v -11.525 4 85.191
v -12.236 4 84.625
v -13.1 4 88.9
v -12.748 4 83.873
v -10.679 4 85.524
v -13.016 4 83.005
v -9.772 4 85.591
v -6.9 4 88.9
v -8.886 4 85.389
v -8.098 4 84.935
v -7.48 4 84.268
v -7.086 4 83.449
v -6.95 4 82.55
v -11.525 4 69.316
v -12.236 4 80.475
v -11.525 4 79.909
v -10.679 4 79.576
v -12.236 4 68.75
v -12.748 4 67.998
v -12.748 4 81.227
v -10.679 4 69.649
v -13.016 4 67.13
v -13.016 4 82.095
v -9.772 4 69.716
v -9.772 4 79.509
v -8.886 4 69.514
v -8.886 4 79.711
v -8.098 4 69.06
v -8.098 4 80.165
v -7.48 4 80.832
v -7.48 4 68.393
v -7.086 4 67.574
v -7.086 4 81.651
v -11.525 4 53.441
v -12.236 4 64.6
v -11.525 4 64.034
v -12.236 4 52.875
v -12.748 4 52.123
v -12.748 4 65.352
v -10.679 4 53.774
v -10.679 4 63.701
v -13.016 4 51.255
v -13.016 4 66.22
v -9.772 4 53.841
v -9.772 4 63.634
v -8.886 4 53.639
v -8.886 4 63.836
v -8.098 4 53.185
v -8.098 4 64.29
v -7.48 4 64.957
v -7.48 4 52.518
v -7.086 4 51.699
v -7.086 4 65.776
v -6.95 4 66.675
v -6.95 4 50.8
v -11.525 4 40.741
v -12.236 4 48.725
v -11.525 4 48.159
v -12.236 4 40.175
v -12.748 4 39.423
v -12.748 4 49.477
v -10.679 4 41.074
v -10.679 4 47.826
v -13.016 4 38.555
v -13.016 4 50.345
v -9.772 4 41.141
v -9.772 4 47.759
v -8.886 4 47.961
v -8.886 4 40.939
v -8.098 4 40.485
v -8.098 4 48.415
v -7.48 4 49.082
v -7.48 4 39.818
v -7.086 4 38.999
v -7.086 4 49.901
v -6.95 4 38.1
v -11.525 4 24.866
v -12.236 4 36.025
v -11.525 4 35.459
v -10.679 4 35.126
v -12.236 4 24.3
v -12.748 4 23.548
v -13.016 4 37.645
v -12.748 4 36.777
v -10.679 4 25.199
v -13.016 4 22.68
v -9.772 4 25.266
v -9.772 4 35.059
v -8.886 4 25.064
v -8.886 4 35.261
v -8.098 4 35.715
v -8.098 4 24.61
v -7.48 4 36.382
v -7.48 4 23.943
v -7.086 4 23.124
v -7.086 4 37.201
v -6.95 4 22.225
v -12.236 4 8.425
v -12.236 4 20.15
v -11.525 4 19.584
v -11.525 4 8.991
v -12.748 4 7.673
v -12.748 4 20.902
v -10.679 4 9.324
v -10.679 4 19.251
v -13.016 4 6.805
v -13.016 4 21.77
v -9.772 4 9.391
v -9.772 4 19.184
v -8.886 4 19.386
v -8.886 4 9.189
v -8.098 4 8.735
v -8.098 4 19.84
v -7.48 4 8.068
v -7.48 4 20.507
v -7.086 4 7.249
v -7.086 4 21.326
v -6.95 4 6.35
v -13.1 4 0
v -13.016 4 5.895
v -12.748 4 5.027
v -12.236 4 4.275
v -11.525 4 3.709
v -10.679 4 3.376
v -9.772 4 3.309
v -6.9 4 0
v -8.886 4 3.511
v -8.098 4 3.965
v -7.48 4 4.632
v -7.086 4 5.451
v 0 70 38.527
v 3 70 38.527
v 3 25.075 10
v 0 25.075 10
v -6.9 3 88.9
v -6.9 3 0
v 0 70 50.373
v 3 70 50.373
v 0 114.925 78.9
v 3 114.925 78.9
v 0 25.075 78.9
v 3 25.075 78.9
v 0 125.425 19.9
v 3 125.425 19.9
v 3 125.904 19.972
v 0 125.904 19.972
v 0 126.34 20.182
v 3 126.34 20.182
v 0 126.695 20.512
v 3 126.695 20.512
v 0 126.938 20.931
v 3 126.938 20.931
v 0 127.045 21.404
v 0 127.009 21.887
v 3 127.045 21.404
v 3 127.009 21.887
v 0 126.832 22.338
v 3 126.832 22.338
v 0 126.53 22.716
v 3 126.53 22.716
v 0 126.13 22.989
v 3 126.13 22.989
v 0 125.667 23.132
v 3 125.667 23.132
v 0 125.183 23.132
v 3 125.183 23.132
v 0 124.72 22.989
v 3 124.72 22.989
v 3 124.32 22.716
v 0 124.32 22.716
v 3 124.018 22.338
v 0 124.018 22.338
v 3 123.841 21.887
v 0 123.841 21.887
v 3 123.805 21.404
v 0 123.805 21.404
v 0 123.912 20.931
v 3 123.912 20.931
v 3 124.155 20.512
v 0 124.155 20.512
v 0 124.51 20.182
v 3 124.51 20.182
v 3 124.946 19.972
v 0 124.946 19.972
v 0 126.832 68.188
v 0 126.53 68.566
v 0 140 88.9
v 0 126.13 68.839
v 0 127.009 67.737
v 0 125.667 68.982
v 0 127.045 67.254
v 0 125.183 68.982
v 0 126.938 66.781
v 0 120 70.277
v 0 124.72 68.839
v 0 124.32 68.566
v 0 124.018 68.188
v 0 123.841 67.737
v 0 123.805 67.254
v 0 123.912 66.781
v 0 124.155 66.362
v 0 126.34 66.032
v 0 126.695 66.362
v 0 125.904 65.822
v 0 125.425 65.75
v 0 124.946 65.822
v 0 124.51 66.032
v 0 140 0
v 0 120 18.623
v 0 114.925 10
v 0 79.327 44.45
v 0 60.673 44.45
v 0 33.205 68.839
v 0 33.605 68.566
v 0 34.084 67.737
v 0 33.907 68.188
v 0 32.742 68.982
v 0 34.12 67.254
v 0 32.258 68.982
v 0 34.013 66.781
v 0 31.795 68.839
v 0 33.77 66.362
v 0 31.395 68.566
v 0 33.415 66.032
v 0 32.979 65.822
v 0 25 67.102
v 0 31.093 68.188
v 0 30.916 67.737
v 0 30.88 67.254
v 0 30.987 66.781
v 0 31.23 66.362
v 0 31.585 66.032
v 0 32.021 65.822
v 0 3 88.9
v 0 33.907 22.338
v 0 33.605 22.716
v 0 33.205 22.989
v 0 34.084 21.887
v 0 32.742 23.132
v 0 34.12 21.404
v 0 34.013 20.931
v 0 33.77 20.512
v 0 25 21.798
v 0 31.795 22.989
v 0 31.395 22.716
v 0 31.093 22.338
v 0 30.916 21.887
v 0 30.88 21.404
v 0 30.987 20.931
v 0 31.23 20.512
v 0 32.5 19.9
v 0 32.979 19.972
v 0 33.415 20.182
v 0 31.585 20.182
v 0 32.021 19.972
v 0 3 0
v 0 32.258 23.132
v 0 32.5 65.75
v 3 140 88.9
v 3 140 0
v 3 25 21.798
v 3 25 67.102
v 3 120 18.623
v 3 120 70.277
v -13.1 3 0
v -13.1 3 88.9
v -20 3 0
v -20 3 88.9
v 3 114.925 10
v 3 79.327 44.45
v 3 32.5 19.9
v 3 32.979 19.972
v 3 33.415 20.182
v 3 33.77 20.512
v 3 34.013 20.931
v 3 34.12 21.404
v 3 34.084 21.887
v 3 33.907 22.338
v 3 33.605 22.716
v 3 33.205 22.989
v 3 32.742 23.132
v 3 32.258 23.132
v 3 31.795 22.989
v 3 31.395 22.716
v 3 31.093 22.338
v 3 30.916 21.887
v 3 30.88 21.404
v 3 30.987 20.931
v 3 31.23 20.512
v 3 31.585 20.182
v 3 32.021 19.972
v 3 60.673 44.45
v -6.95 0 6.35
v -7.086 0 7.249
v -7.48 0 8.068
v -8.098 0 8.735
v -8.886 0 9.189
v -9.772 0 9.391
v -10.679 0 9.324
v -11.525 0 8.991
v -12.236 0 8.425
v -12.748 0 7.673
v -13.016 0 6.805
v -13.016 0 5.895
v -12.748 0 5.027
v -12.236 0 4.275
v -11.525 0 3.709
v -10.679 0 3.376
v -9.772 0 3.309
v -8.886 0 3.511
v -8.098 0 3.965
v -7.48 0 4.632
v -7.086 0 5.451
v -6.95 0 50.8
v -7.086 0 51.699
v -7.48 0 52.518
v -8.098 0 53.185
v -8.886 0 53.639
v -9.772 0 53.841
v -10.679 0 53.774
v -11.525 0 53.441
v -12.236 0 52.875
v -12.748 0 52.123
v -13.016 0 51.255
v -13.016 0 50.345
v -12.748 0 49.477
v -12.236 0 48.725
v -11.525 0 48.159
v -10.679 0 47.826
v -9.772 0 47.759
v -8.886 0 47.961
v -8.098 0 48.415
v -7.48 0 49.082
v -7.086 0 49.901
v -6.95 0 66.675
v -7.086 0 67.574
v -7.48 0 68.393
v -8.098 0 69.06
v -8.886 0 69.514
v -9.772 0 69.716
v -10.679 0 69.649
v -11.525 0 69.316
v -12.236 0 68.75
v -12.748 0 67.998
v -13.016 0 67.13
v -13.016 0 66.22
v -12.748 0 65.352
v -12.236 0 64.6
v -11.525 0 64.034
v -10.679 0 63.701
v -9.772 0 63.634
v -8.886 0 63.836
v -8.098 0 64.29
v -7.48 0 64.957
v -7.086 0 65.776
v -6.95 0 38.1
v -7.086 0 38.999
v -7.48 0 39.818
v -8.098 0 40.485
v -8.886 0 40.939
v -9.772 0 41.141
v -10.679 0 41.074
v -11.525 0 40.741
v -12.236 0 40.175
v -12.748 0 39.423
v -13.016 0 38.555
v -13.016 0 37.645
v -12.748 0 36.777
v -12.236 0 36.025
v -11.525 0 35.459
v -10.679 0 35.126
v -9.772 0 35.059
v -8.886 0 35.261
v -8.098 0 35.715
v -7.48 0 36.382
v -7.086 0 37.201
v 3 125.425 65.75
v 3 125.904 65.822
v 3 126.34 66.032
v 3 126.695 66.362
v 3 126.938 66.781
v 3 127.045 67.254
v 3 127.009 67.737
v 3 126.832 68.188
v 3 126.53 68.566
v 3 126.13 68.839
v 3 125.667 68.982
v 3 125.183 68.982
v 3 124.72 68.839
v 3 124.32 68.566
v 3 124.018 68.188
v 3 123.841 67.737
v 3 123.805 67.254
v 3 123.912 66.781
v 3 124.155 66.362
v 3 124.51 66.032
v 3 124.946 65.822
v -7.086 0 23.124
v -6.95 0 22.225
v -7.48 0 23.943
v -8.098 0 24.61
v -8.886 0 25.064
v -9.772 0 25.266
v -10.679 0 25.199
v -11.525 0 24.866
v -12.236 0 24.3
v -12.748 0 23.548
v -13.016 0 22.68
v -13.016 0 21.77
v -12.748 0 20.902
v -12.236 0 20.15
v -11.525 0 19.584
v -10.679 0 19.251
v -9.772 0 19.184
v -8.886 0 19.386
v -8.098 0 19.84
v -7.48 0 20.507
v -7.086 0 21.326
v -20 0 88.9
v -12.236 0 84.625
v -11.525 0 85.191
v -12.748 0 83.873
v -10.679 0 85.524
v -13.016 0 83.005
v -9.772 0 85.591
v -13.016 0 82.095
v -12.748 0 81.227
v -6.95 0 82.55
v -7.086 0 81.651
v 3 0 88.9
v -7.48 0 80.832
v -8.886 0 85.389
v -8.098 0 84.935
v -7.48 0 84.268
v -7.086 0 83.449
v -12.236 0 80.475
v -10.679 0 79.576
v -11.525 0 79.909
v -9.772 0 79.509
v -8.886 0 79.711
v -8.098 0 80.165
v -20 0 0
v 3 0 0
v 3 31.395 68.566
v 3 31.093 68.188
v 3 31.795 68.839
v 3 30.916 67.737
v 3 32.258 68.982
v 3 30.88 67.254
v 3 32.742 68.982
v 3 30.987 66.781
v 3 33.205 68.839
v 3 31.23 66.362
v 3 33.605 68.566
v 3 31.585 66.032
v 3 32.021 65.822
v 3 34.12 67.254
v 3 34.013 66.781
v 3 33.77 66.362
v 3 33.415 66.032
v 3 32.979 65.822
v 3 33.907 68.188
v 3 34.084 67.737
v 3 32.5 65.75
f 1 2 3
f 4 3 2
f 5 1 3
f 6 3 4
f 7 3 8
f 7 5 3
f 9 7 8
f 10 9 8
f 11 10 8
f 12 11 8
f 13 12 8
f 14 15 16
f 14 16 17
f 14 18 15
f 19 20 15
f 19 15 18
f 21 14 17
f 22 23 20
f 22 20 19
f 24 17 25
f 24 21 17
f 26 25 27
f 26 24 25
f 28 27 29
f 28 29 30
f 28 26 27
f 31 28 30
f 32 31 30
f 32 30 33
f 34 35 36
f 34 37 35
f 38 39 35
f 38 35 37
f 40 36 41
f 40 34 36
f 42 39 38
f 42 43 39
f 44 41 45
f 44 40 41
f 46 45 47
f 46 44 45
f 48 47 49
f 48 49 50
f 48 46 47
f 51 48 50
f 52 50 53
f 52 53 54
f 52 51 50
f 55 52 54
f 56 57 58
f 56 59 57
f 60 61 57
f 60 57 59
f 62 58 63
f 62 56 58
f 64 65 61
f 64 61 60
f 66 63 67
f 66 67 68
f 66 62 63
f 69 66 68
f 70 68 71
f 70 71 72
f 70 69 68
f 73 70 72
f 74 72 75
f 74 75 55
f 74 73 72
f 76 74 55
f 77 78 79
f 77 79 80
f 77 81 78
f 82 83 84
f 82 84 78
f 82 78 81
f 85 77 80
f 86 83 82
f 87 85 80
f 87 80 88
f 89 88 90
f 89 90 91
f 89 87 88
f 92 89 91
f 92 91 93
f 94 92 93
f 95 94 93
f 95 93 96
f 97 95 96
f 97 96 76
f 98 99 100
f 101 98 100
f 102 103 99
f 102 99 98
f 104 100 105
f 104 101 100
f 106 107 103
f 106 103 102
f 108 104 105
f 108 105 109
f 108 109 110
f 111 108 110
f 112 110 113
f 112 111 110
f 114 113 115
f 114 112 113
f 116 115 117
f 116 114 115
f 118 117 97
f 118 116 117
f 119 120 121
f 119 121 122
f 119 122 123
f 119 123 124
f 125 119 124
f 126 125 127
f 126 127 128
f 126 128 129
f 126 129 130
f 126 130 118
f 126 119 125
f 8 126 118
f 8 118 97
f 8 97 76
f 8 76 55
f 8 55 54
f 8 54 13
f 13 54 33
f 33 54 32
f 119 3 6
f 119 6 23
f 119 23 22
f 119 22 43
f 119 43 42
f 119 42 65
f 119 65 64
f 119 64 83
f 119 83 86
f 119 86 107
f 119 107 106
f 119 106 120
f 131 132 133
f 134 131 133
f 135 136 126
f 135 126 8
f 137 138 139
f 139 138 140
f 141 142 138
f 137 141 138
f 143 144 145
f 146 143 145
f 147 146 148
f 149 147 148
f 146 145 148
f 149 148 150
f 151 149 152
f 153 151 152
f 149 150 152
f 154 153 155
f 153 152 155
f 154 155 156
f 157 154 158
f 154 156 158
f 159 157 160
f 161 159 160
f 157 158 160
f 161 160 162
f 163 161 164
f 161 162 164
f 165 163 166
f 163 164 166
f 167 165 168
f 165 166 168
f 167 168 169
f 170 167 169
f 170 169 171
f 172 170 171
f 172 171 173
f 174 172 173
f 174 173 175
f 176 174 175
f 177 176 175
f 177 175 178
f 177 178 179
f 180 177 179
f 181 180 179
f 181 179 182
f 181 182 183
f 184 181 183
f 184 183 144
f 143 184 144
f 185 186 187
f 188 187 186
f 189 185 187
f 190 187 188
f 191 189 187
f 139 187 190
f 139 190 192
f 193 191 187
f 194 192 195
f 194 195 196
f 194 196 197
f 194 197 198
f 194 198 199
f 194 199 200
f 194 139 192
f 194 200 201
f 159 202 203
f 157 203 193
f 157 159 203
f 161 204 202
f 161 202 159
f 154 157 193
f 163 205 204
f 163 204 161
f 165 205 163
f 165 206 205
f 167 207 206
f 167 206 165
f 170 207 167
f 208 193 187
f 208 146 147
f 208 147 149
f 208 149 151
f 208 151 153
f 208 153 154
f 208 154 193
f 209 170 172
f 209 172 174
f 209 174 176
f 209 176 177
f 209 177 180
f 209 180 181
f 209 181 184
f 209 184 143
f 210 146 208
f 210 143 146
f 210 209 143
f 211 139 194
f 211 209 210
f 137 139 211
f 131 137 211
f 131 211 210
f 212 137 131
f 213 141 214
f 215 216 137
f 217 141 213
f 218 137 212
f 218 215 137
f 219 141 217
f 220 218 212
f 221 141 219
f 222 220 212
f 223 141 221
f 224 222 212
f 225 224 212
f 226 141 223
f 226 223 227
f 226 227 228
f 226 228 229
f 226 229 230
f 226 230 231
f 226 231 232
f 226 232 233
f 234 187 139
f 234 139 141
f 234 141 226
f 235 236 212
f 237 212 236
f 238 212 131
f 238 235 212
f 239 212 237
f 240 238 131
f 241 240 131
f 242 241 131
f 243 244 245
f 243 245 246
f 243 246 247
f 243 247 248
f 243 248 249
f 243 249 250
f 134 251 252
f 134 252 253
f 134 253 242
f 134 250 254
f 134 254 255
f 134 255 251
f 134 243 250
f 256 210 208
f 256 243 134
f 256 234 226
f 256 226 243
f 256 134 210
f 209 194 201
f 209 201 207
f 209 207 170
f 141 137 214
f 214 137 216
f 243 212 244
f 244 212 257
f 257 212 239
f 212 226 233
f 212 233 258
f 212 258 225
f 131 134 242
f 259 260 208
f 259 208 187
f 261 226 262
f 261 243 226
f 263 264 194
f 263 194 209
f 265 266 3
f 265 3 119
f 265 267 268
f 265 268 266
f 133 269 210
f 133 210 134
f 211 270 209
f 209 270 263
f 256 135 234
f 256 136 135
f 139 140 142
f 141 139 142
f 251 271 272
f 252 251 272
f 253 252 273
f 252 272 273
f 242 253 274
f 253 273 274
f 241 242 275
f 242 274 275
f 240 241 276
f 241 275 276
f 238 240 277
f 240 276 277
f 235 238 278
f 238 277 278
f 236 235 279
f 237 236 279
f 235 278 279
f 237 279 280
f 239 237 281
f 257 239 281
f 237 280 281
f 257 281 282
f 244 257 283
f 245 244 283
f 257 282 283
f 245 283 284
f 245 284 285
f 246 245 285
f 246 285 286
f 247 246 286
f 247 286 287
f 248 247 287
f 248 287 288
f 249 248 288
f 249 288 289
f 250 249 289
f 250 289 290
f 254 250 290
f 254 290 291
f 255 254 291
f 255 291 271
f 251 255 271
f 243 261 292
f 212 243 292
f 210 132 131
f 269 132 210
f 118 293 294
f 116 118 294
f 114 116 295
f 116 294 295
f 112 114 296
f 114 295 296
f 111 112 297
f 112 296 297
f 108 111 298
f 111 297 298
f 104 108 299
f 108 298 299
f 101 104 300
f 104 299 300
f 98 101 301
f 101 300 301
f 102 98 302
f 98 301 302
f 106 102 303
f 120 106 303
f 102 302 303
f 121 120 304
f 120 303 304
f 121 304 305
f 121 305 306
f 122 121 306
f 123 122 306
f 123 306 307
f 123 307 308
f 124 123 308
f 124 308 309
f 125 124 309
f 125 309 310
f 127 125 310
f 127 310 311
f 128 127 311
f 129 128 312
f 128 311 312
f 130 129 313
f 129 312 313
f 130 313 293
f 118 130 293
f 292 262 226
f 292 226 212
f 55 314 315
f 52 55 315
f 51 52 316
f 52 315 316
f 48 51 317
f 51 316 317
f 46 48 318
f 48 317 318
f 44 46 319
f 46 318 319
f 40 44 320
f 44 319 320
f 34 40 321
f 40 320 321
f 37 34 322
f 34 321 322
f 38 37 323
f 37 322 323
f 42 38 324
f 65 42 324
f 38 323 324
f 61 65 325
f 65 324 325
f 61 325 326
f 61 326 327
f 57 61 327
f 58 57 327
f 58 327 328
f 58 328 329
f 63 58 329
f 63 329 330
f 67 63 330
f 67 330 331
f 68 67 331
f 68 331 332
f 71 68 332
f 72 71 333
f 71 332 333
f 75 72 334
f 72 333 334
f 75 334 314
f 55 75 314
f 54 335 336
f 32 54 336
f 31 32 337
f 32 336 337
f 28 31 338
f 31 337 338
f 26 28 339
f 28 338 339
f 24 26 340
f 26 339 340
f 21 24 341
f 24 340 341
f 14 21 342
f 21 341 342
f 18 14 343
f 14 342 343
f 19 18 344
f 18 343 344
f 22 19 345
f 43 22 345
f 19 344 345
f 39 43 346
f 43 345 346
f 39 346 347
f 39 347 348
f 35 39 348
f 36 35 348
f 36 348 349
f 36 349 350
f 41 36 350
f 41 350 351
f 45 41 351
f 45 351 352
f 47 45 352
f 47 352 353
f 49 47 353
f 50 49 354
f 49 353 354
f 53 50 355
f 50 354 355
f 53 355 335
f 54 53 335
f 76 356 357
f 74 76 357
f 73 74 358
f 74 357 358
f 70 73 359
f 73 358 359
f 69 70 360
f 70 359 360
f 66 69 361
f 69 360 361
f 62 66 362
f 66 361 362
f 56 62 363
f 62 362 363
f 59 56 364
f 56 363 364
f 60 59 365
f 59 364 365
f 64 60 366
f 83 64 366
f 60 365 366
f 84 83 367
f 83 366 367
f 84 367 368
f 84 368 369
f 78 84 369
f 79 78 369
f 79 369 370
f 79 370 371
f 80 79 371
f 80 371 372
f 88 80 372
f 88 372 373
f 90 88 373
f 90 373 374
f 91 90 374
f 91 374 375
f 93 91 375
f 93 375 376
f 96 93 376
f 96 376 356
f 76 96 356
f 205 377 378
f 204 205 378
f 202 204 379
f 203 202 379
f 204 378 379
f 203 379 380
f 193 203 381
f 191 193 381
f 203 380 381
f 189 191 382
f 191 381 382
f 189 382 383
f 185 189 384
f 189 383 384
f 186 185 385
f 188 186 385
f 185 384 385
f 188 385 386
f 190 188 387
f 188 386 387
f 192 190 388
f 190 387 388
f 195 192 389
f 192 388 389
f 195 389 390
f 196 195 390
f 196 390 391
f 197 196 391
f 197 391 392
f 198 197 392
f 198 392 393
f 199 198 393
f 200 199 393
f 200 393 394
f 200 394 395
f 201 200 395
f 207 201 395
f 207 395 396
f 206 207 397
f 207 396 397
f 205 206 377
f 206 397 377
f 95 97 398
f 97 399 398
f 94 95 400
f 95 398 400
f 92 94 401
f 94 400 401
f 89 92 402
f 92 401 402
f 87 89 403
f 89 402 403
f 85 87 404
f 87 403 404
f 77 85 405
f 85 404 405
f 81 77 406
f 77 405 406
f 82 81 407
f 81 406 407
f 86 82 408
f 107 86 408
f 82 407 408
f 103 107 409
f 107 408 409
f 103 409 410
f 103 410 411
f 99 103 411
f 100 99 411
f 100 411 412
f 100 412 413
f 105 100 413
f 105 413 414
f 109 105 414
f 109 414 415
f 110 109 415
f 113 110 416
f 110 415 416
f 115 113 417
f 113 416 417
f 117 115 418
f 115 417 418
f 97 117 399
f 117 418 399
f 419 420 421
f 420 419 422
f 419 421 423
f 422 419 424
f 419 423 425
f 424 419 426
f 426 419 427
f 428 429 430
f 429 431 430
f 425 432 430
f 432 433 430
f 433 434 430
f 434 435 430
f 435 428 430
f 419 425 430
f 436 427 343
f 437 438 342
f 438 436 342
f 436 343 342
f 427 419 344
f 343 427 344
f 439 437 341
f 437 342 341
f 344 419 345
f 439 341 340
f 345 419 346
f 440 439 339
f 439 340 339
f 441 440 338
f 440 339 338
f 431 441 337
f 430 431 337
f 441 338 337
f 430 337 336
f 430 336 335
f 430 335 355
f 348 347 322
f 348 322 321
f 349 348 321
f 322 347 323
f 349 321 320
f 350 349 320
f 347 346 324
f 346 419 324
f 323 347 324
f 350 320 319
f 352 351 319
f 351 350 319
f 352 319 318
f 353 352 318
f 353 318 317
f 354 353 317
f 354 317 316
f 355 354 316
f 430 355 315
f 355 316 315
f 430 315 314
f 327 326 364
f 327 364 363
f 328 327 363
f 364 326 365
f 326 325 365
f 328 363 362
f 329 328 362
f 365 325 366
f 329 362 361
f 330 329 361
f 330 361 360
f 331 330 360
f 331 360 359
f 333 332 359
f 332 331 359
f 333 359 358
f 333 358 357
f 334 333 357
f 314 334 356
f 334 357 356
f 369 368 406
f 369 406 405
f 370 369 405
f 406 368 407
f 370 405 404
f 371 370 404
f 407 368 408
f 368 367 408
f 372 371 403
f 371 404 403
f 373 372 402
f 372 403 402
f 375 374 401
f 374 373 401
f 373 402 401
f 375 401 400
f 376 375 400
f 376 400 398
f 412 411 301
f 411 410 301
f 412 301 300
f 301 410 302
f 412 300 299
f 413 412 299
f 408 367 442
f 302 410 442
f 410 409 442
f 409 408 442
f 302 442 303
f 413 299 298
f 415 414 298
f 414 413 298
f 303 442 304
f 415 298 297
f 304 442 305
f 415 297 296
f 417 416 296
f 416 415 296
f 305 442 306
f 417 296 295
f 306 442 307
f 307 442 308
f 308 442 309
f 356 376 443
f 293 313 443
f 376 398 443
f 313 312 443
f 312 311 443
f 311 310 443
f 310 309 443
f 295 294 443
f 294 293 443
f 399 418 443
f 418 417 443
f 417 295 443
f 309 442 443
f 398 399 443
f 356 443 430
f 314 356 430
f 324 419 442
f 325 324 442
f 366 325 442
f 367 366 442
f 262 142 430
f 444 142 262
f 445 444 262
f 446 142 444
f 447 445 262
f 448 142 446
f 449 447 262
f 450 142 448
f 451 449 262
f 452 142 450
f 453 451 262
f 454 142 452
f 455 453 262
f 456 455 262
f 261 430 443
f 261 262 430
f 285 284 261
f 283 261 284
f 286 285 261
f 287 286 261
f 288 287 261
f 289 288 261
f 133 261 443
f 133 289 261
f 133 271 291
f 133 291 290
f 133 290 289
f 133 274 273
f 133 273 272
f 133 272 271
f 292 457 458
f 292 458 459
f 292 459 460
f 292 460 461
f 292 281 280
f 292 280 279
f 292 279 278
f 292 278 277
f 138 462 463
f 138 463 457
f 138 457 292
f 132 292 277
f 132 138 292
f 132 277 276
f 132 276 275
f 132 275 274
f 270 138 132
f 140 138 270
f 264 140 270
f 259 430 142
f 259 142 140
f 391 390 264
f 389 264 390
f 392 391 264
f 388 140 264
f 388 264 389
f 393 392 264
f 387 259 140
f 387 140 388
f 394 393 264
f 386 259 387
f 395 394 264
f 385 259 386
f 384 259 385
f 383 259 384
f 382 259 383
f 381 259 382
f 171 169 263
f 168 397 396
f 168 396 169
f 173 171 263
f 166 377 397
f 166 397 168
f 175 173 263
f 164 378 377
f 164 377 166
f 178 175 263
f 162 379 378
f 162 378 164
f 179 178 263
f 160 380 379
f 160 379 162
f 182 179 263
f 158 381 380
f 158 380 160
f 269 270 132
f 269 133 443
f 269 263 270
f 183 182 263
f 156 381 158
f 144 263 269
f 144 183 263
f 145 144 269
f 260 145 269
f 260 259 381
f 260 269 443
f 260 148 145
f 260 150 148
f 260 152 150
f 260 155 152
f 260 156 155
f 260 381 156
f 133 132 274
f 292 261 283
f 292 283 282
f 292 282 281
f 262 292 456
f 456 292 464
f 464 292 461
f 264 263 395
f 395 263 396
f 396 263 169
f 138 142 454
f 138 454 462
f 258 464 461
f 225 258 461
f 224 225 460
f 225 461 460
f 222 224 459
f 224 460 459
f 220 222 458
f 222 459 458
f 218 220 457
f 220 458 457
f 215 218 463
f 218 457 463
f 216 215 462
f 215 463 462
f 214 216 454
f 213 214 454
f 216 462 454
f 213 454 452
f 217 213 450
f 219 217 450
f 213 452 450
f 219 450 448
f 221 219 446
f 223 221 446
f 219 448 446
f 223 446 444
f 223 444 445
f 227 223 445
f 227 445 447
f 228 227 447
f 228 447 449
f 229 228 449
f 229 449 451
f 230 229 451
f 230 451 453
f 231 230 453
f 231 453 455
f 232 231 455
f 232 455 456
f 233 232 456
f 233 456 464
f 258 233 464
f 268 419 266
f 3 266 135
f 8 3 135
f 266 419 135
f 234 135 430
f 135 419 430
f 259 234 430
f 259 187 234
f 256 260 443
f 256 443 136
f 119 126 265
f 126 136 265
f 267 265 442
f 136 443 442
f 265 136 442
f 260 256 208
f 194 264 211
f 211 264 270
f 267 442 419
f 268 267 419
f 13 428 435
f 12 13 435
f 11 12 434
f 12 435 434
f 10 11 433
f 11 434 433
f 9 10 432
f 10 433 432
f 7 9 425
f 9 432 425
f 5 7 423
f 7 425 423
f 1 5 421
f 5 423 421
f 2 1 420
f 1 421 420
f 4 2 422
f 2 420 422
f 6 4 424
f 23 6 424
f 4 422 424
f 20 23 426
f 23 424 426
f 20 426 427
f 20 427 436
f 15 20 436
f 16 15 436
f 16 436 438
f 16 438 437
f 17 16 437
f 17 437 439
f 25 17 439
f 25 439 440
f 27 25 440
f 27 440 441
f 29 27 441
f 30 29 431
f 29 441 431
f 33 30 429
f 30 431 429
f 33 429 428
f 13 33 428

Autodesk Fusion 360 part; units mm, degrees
sketch "PrimarySSD" plane through (0, 0, 0) normal (0, 1, 0) x (1, 0, 0)
  line L0 (0, 0) -> (7, 0)
  circle A0 centre (4, -14) radius 1.55
  circle A1 centre (4, -90.6) radius 1.55
  line L1 (0, 0) -> (-2.5, 0)
  line L2 (-2.5, 0) -> (-2.5, -100.45)
  line L3 (0, -100.45) -> (0, 0)
  line L4 (7, 0) -> (9.5, 0)
  line L5 (9.5, 0) -> (9.5, -100.45)
  line L6 (7, -100.45) -> (7, 0)
  line L7 (-2.5, -100.45) -> (9.5, -100.45)
  line L8 (-2.5, -100.45) -> (9.5, -100.45)
  line L9 (9.5, -100.45) -> (9.5, -102.95)
  line L10 (9.5, -102.95) -> (-2.5, -102.95)
  line L11 (-2.5, -102.95) -> (-2.5, -100.45)
  dimension "d1" = 7
  dimension "d3" = 3.1
  dimension "d5" = 14
  dimension "d6" = 3.1
  dimension "d8" = 90.6
  dimension "d10" = 100.45
  dimension "d12" = 100.45
  dimension "d17" = 2.5
  dimension "d18" = 2.5
  dimension "d19" = 12
  dimension "d20" = 3
  dimension "d21" = 3
  dimension "d44" = 9.85
  dimension "d92" = 12
  dimension "d93" = 2.5
extrude "Extrude1" add sketch "PrimarySSD" along normal blind 10 contours L1 L2 L3 L7 L8 | L4 L5 L6 L7 L8 makes body 1 at (0, 3.3333, 66.9667) makes body 2 at (9.5, 3.3333, 33.4833)
extrude "Extrude6" add sketch "PrimarySSD" along normal blind 3 contours L0 L3 L6 L7 L8 bodies 1 2
ref_plane "WorkPlane2" through (3.5, 72.85, 50.225) normal (0, 1, 0) x (1, 0, 0)
sketch "TopSSD" plane through (0, 72.85, 0) normal (0, 1, 0) x (1, 0, 0)
  line L0 (-2.5, 0) -> (-2.5, -100.45)
  line L1 (0, -100.45) -> (0, 0)
  line L2 (7, -100.45) -> (7, 0)
  line L3 (9.5, 0) -> (9.5, -100.45)
  line L4 (-2.5, -100.45) -> (9.5, -100.45)
  line L5 (0, 0) -> (7, 0)
  line L6 (7, 0) -> (9.5, 0)
  line L7 (0, 0) -> (-2.5, 0)
  circle A0 centre (4, -14) radius 1.55
  circle A1 centre (4, -90.6) radius 1.55
  line L8 (9.5, -102.95) -> (-2.5, -102.95)
  line L9 (9.5, -100.45) -> (9.5, -102.95)
  line L10 (-2.5, -102.95) -> (-2.5, -100.45)
  point P0 (4, -14)
  point P1 (4, -90.6)
  point P2 (9.5, 0)
  point P3 (-2.5, 0)
  point P4 (9.5, -100.45)
extrude "Extrude12" add sketch "PrimarySSD" along normal blind 10 contours L7 L8 L9 L10 L11 bodies 1
pattern_linear "R-Pattern1" count 18 spacing 12 along (1, 0, 0) of bodies 1 makes body 3 at (15.6281, 0, 4.1514) makes body 4 at (27.6281, 0, 4.1514) makes body 5 at (39.6281, 0, 4.1514) makes body 6 at (51.6281, 0, 4.1514) makes body 7 at (63.6281, 0, 4.1514) makes body 8 at (75.6281, 0, 4.1514) makes body 9 at (87.6281, 0, 4.1514) makes body 10 at (99.6281, 0, 4.1514) makes body 11 at (111.6281, 0, 4.1514) makes body 12 at (123.6281, 0, 4.1514) makes body 13 at (135.6281, 0, 4.1514) makes body 14 at (147.6281, 0, 4.1514) makes body 15 at (159.6281, 0, 4.1514) makes body 16 at (171.6281, 0, 4.1514) makes body 17 at (183.6281, 0, 4.1514) makes body 18 at (195.6281, 0, 4.1514) makes body 19 at (207.6281, 0, 4.1514)
combine "Combine6" operation add target body 1 tool bodies 3 13 17 16 18 19 10 11 14 5 6 15 9 8 7 4 12
ref_plane "WorkPlane5" through (-2.5, 5, 51.475) normal (-1, 0, 0) x (0, 0, 1)
sketch "Left Mount" plane through (-2.5, 0, 0) normal (-1, 0, 0) x (0, 0, 1)
  line L0 (0, 0) -> (102.95, 0)
  line L1 (102.95, 0) -> (102.95, 10)
  line L2 (102.95, 10) -> (0, 10)
  line L3 (0, 10) -> (0, 0)
  line L4 (0, 10) -> (10, 10)
  line L5 (10, 10) -> (10, 20)
  line L6 (10, 20) -> (0, 20)
  line L7 (0, 20) -> (0, 10)
  line L8 (51.475, 0) -> (51.475, 10)
  line L9 (102.95, 20) -> (102.95, 10)
  line L10 (92.95, 20) -> (102.95, 20)
  line L11 (102.95, 10) -> (92.95, 10)
  line L12 (92.95, 10) -> (92.95, 20)
  circle A0 centre (5, 15) radius 1.625
  circle A1 centre (97.95, 15) radius 1.625
  line L13 (7.75, 16.5877) -> (5, 18.1754)
  line L14 (5, 18.1754) -> (2.25, 16.5877)
  line L15 (2.25, 16.5877) -> (2.25, 13.4123)
  line L16 (2.25, 13.4123) -> (5, 11.8246)
  line L17 (5, 11.8246) -> (7.75, 13.4123)
  line L18 (7.75, 13.4123) -> (7.75, 16.5877)
  line L19 (95.2, 16.5877) -> (97.95, 18.1754)
  line L20 (97.95, 18.1754) -> (100.7, 16.5877)
  line L21 (100.7, 16.5877) -> (100.7, 13.4123)
  line L22 (100.7, 13.4123) -> (97.95, 11.8246)
  line L23 (97.95, 11.8246) -> (95.2, 13.4123)
  line L24 (95.2, 13.4123) -> (95.2, 16.5877)
  point P0 (5, 15)
  dimension "d103" = 10
  dimension "d104" = 10
  dimension "d105" = 3.25
  dimension "d106" = 5
  dimension "d107" = 5
  dimension "d108" = 2.75
extrude "Extrude15" add sketch "Left Mount" against normal blind 2.5 contours L2 L4 L5 L6 L7 bodies 1
extrude "Extrude16" add sketch "Left Mount" against normal blind 2.5 contours L2 L9 L10 L11 L12 bodies 1
extrude "Extrude17" add sketch "Left Mount" along normal blind 2.5 contours L2 L9 L10 L11 L12 | L19 L20 L21 L22 L23 L24 bodies 1
extrude "Extrude18" add sketch "Left Mount" along normal blind 2.5 contours L2 L4 L5 L6 L7 | L13 L14 L15 L16 L17 L18 bodies 1
ref_plane "WorkPlane6" through (213.5, 5, 51.475) normal (1, 0, 0) x (0, 0, -1)
sketch "Right Mount" plane through (213.5, 0, 0) normal (1, 0, 0) x (0, 0, -1)
  line L0 (-102.95, 0) -> (-102.95, 10)
  line L1 (0, 0) -> (-102.95, 0)
  line L2 (-102.95, 10) -> (0, 10)
  line L3 (0, 10) -> (0, 0)
  line L4 (0, 20) -> (0, 10)
  line L5 (-2.25, 16.5877) -> (-2.25, 13.4123)
  line L6 (-2.25, 13.4123) -> (-5, 11.8246)
  line L7 (-5, 11.8246) -> (-7.75, 13.4123)
  line L8 (-7.75, 13.4123) -> (-7.75, 16.5877)
  line L9 (-7.75, 16.5877) -> (-5, 18.1754)
  line L10 (-5, 18.1754) -> (-2.25, 16.5877)
  circle A0 centre (-5, 15) radius 1.625
  line L11 (-10, 20) -> (0, 20)
  line L12 (-10, 10) -> (-10, 20)
  line L13 (-92.95, 10) -> (-92.95, 20)
  line L14 (-92.95, 20) -> (-102.95, 20)
  line L15 (-102.95, 20) -> (-102.95, 10)
  line L16 (-100.7, 16.5877) -> (-100.7, 13.4123)
  line L17 (-100.7, 13.4123) -> (-97.95, 11.8246)
  line L18 (-97.95, 11.8246) -> (-95.2, 13.4123)
  line L19 (-95.2, 13.4123) -> (-95.2, 16.5877)
  line L20 (-95.2, 16.5877) -> (-97.95, 18.1754)
  line L21 (-97.95, 18.1754) -> (-100.7, 16.5877)
  circle A1 centre (-97.95, 15) radius 1.625
  point P0 (-5, 15)
  point P1 (-97.95, 15)
extrude "Extrude19" add sketch "Right Mount" against normal blind 2.5 contours L2 L13 L14 L15 bodies 1
extrude "Extrude20" add sketch "Right Mount" along normal blind 2.5 contours L2 L13 L14 L15 | L16 L17 L18 L19 L20 L21 bodies 1
extrude "Extrude21" add sketch "Right Mount" against normal blind 2.5 contours L2 L4 L11 L12 bodies 1
extrude "Extrude22" add sketch "Right Mount" along normal blind 2.5 contours L2 L4 L11 L12 | L5 L6 L7 L8 L9 L10 bodies 1
sketch "Sketch13" plane through (0, 10, 0) normal (0, 1, 0) x (-1, 0, 0)
  line L0 (-211, 102.95) -> (-211, 100.45)
  line L1 (-211, 100.45) -> (-204, 100.45)
  line L2 (-204, 100.45) -> (-204, 0)
  line L3 (-204, 0) -> (-199, 0)
  line L4 (-199, 0) -> (-199, 100.45)
  line L5 (-199, 100.45) -> (-192, 100.45)
  line L6 (-192, 100.45) -> (-192, 0)
  line L7 (-192, 0) -> (-187, 0)
  line L8 (-187, 0) -> (-187, 100.45)
  line L9 (-187, 100.45) -> (-180, 100.45)
  line L10 (-180, 100.45) -> (-180, 0)
  line L11 (-180, 0) -> (-175, 0)
  line L12 (-175, 0) -> (-175, 100.45)
  line L13 (-175, 100.45) -> (-168, 100.45)
  line L14 (-168, 100.45) -> (-168, 0)
  line L15 (-168, 0) -> (-163, 0)
  line L16 (-163, 0) -> (-163, 100.45)
  line L17 (-163, 100.45) -> (-156, 100.45)
  line L18 (-156, 100.45) -> (-156, 0)
  line L19 (-156, 0) -> (-151, 0)
  line L20 (-151, 0) -> (-151, 100.45)
  line L21 (-151, 100.45) -> (-144, 100.45)
  line L22 (-144, 100.45) -> (-144, 0)
  line L23 (-144, 0) -> (-139, 0)
  line L24 (-139, 0) -> (-139, 100.45)
  line L25 (-139, 100.45) -> (-132, 100.45)
  line L26 (-132, 100.45) -> (-132, 0)
  line L27 (-132, 0) -> (-127, 0)
  line L28 (-127, 0) -> (-127, 100.45)
  line L29 (-127, 100.45) -> (-120, 100.45)
  line L30 (-120, 100.45) -> (-120, 0)
  line L31 (-120, 0) -> (-115, 0)
  line L32 (-115, 0) -> (-115, 100.45)
  line L33 (-115, 100.45) -> (-108, 100.45)
  line L34 (-108, 100.45) -> (-108, 0)
  line L35 (-108, 0) -> (-103, 0)
  line L36 (-103, 0) -> (-103, 100.45)
  line L37 (-103, 100.45) -> (-96, 100.45)
  line L38 (-96, 100.45) -> (-96, 0)
  line L39 (-96, 0) -> (-91, 0)
  line L40 (-91, 0) -> (-91, 100.45)
  line L41 (-91, 100.45) -> (-84, 100.45)
  line L42 (-84, 100.45) -> (-84, 0)
  line L43 (-84, 0) -> (-79, 0)
  line L44 (-79, 0) -> (-79, 100.45)
  line L45 (-79, 100.45) -> (-72, 100.45)
  line L46 (-72, 100.45) -> (-72, 0)
  line L47 (-72, 0) -> (-67, 0)
  line L48 (-67, 0) -> (-67, 100.45)
  line L49 (-67, 100.45) -> (-60, 100.45)
  line L50 (-60, 100.45) -> (-60, 0)
  line L51 (-60, 0) -> (-55, 0)
  line L52 (-55, 0) -> (-55, 100.45)
  line L53 (-55, 100.45) -> (-48, 100.45)
  line L54 (-48, 100.45) -> (-48, 0)
  line L55 (-48, 0) -> (-43, 0)
  line L56 (-43, 0) -> (-43, 100.45)
  line L57 (-43, 100.45) -> (-36, 100.45)
  line L58 (-36, 100.45) -> (-36, 0)
  line L59 (-36, 0) -> (-31, 0)
  line L60 (-31, 0) -> (-31, 100.45)
  line L61 (-31, 100.45) -> (-24, 100.45)
  line L62 (-24, 100.45) -> (-24, 0)
  line L63 (-24, 0) -> (-19, 0)
  line L64 (-19, 0) -> (-19, 100.45)
  line L65 (-19, 100.45) -> (-12, 100.45)
  line L66 (-12, 100.45) -> (-12, 0)
  line L67 (-12, 0) -> (-7, 0)
  line L68 (-7, 0) -> (-7, 100.45)
  line L69 (-7, 100.45) -> (0, 100.45)
  line L70 (0, 100.45) -> (0, 102.95)
  line L71 (0, 102.95) -> (-211, 102.95)
  line L72 (2.5, 102.95) -> (-15.75, 102.95)
  line L73 (-7, 100.45) -> (0, 100.45)
  line L74 (-19, 100.45) -> (-12, 100.45)
  line L75 (-211, 102.95) -> (0, 102.95)
  line L76 (-31, 100.45) -> (-24, 100.45)
  line L77 (-43, 100.45) -> (-36, 100.45)
  line L78 (0, 102.95) -> (-211, 102.95)
  line L79 (-211, 102.95) -> (-211, 100.45)
  line L80 (-211, 100.45) -> (0, 100.45)
  line L81 (0, 100.45) -> (0, 102.95)
  line L82 (-211, 102.95) -> (-211, 100.45)
  line L83 (-211, 100.45) -> (-204, 100.45)
  line L84 (-204, 100.45) -> (-204, 0)
  line L85 (-204, 0) -> (-199, 0)
  line L86 (-199, 0) -> (-199, 100.45)
  line L87 (-199, 100.45) -> (-192, 100.45)
  line L88 (-192, 100.45) -> (-192, 0)
  line L89 (-192, 0) -> (-187, 0)
  line L90 (-187, 0) -> (-187, 100.45)
  line L91 (-187, 100.45) -> (-180, 100.45)
  line L92 (-180, 100.45) -> (-180, 0)
  line L93 (-180, 0) -> (-175, 0)
  line L94 (-175, 0) -> (-175, 100.45)
  line L95 (-175, 100.45) -> (-168, 100.45)
  line L96 (-168, 100.45) -> (-168, 0)
  line L97 (-168, 0) -> (-163, 0)
  line L98 (-163, 0) -> (-163, 100.45)
  line L99 (-163, 100.45) -> (-156, 100.45)
  line L100 (-156, 100.45) -> (-156, 0)
  line L101 (-156, 0) -> (-151, 0)
  line L102 (-151, 0) -> (-151, 100.45)
  line L103 (-151, 100.45) -> (-144, 100.45)
  line L104 (-144, 100.45) -> (-144, 0)
  line L105 (-144, 0) -> (-139, 0)
  line L106 (-139, 0) -> (-139, 100.45)
  line L107 (-139, 100.45) -> (-132, 100.45)
  line L108 (-132, 100.45) -> (-132, 0)
  line L109 (-132, 0) -> (-127, 0)
  line L110 (-127, 0) -> (-127, 100.45)
  line L111 (-127, 100.45) -> (-120, 100.45)
  line L112 (-120, 100.45) -> (-120, 0)
  line L113 (-120, 0) -> (-115, 0)
  line L114 (-115, 0) -> (-115, 100.45)
  line L115 (-115, 100.45) -> (-108, 100.45)
  line L116 (-108, 100.45) -> (-108, 0)
  line L117 (-108, 0) -> (-103, 0)
  line L118 (-103, 0) -> (-103, 100.45)
  line L119 (-103, 100.45) -> (-96, 100.45)
  line L120 (-96, 100.45) -> (-96, 0)
  line L121 (-96, 0) -> (-91, 0)
  line L122 (-91, 0) -> (-91, 100.45)
  line L123 (-91, 100.45) -> (-84, 100.45)
  line L124 (-84, 100.45) -> (-84, 0)
  line L125 (-84, 0) -> (-79, 0)
  line L126 (-79, 0) -> (-79, 100.45)
  line L127 (-79, 100.45) -> (-72, 100.45)
  line L128 (-72, 100.45) -> (-72, 0)
  line L129 (-72, 0) -> (-67, 0)
  line L130 (-67, 0) -> (-67, 100.45)
  line L131 (-67, 100.45) -> (-60, 100.45)
  line L132 (-60, 100.45) -> (-60, 0)
  line L133 (-60, 0) -> (-55, 0)
  line L134 (-55, 0) -> (-55, 100.45)
  line L135 (-55, 100.45) -> (-48, 100.45)
  line L136 (-48, 100.45) -> (-48, 0)
  line L137 (-48, 0) -> (-43, 0)
  line L138 (-43, 0) -> (-43, 100.45)
  line L139 (-43, 100.45) -> (-36, 100.45)
  line L140 (-36, 100.45) -> (-36, 0)
  line L141 (-36, 0) -> (-31, 0)
  line L142 (-31, 0) -> (-31, 100.45)
  line L143 (-31, 100.45) -> (-24, 100.45)
  line L144 (-24, 100.45) -> (-24, 0)
  line L145 (-24, 0) -> (-19, 0)
  line L146 (-19, 0) -> (-19, 100.45)
  line L147 (-19, 100.45) -> (-12, 100.45)
  line L148 (-12, 100.45) -> (-12, 0)
  line L149 (-12, 0) -> (-7, 0)
  line L150 (-7, 0) -> (-7, 100.45)
  line L151 (-7, 100.45) -> (0, 100.45)
  line L152 (0, 100.45) -> (0, 102.95)
  line L153 (0, 102.95) -> (-211, 102.95)
  dimension "d187" = 211
  dimension "d188" = 2.5
extrude "Extrude35" cut sketch "Sketch13" against normal blind 6.5 contours L0 L1 L5 L9 L13 L17 L21 L25 L29 L33 L37 L41 L45 L49 L53 L57 L61 L65 L69 L70 L71 L72 L73 L74 L75 L76 L77 L78 L79 L80 L81 L82 L83 L87 L91 L95 L99 L103 L107 L111 L115 L119 L123 L127 L131 L135 L139 L143 L147 L151 L152 L153 bodies 1
sketch "Sketch14" plane through (0, 0, 0) normal (0, 1, 0) x (1, 0, 0)
  line L0 (-2.5, 0) -> (213.5, 0)
  line L1 (-2.5, 0) -> (213.5, 0)
  line L2 (213.5, 0) -> (213.5, 1.6)
  line L3 (213.5, 1.6) -> (-2.5, 1.6)
  line L4 (-2.5, 1.6) -> (-2.5, 0)
  line L5 (-2.5, 0) -> (213.5, 0)
  line L6 (213.5, 0) -> (213.5, 2.5)
  line L7 (213.5, 2.5) -> (-2.5, 2.5)
  line L8 (-2.5, 2.5) -> (-2.5, 0)
  dimension "d191" = 216
  dimension "d192" = 1.6
  dimension "d193" = 2.5
extrude "Extrude36" add sketch "Sketch14" along normal blind 3 bodies 1
extrude "Extrude37" add sketch "Sketch14" along normal blind 5 contours L3 L6 L7 L8 bodies 1

Autodesk Fusion 360 part; units mm, degrees
sketch "Sketch1" plane through (0, 0, 0) normal (0, 1, 0) x (1, 0, 0)
  line L0 (0, 0) -> (-20, 0)
  line L1 (-20, 0) -> (-20, -44.45)
  line L2 (-20, -44.45) -> (0, -44.45)
  line L3 (0, -44.45) -> (0, 0)
  line L4 (-10, 0) -> (-10, -44.45)
  circle A0 centre (-10, -6.35) radius 3.05
  circle A1 centre (-10, -22.225) radius 3.05
  circle A2 centre (-10, -38.1) radius 3.05
  line L5 (-6.9, -44.45) -> (-13.1, -44.45)
  line L6 (-13.1, -44.45) -> (-13.1, 0)
  line L7 (-13.1, 0) -> (-6.9, 0)
  line L8 (-6.9, 0) -> (-6.9, -44.45)
  line L9 (-6.9, -44.45) -> (-13.1, 0) construction
  line L10 (-13.1, -44.45) -> (-6.9, 0) construction
  line L11 (0, 0) -> (3, 0)
  line L12 (3, 0) -> (3, -44.45)
  line L13 (3, -44.45) -> (0, -44.45)
  line L14 (0, -44.45) -> (0, 0)
  point P0 (-10, -22.225)
  dimension "d1" = 20
  dimension "d2" = 44.45
  dimension "d3" = 6.1
  dimension "d4" = 6.35
  dimension "d5" = 6.1
  dimension "d6" = 15.875
  dimension "d7" = 6.1
  dimension "d8" = 15.875
  dimension "d9" = 6.35
  dimension "d10" = 6.2
  dimension "d11" = 44.45
  dimension "d12" = 3
  dimension "d13" = 44.45
extrude "Extrude1" add sketch "Sketch1" along normal blind 3 contours L0 L2 L3 L8 L14 | L3 L11 L12 L13 L14 | L0 L2 L4 A0 A1 A2 L5 L7 L8 | L0 L2 L4 A0 A1 A2 L5 L6 L7 | L0 L1 L2 L6 makes body 1
extrude "Extrude2" add sketch "Sketch1" along normal blind 25 contours L3 L11 L12 L13 L14 bodies 1
extrude "Extrude3" add sketch "Sketch1" along normal blind 4 separate body contours L0 L2 L4 A0 A1 A2 L5 L7 L8 | L0 L2 L4 A0 A1 A2 L5 L6 L7 makes body 2
combine "Combine1" operation add target body 1 tool bodies 2
pattern_linear "R-Pattern1" count 1 spacing 0 along (1, 0, 0) count 2 spacing 44.45 along (0, 0, 1) of bodies 1 makes body 3
combine "Combine2" operation add target body 1 tool bodies 3
sketch "Sketch2" plane through (3, 0, 0) normal (1, 0, 0) x (0, 0, -1)
  line L0 (-88.9, 0) -> (0, 0)
  line L1 (0, 0) -> (0, 25)
  line L2 (0, 25) -> (-88.9, 25)
  line L3 (-88.9, 25) -> (-88.9, 0)
  line L4 (-88.9, 0) -> (0, 0)
  line L5 (0, 0) -> (0, 140)
  line L6 (0, 140) -> (-88.9, 140)
  line L7 (-88.9, 140) -> (-88.9, 0)
  line L8 (-44.45, 140) -> (-44.45, 0)
  line L9 (-88.9, 70) -> (0, 70)
  line L10 (0, 140) -> (-88.9, 0)
  line L11 (-88.9, 140) -> (0, 0)
  line L12 (-88.9, 9.3274) -> (-5.9229, 140)
  line L13 (-82.9771, 0) -> (0, 130.6726)
  line L14 (-82.9771, 140) -> (0, 9.3274)
  line L15 (-5.9229, 0) -> (-88.9, 130.6726)
  line L16 (-78.9, 140) -> (-78.9, 0)
  line L17 (-10, 140) -> (-10, 0)
  line L18 (-88.9, 3) -> (0, 3)
  line L19 (-88.9, 23) -> (0, 23) construction
  line L20 (-88.9, 25) -> (0, 25) construction
  circle A0 centre (-67.375, 32.5) radius 1.625
  circle A1 centre (-21.525, 32.5) radius 1.625
  circle A2 centre (-21.525, 125.425) radius 1.625
  circle A3 centre (-67.375, 125.425) radius 1.625
  line L21 (-88.9, 120) -> (0, 120)
  dimension "d24" = 88.9
  dimension "d25" = 140
  dimension "d26" = 10
  dimension "d27" = 10
  dimension "d28" = 10
  dimension "d29" = 10
  dimension "d30" = 10
  dimension "d31" = 10
  dimension "d32" = 20
  dimension "d33" = 25
  dimension "d34" = 3.25
  dimension "d35" = 7.5
  dimension "d36" = 3.25
  dimension "d37" = 7.5
  dimension "d40" = 45.85
  dimension "d41" = 45.85
  dimension "d42" = 3.25
  dimension "d43" = 92.925
  dimension "d44" = 45.85
  dimension "d45" = 3.25
  dimension "d46" = 92.925
  dimension "d47" = 45.85
  dimension "d48" = 20
extrude "Extrude4" add sketch "Sketch2" against normal blind 3 contours L2 L7 L9 L12 L16 | L2 L12 L16 | L2 L10 L13 L15 A0 | L2 L10 L12 L15 L16 A0 | L7 L9 L15 L16 L21 | L8 L10 L15 | L8 L11 L13 | L2 L11 L13 L15 A1 | L7 L15 L21 | L9 L11 L12 | L11 L12 L15 L16 L21 | L9 L10 L15 | L8 L11 L12 | L9 L10 L14 | L8 L10 L14 | L9 L11 L13 | L2 L11 L13 L14 L17 A1 | L7 L11 L15 L16 L21 | L15 L16 L21 | L11 L12 L14 L21 | L10 L12 L14 L21 | L10 L13 L14 L17 L21 | L6 L11 L14 L16 | L11 L14 L16 L21 | L2 L14 L17 | L6 L8 L14 L16 L21 | L6 L8 L12 L17 L21 | L10 L12 L17 L21 | L5 L9 L13 L17 L21 | L2 L5 L9 L14 L17 | L13 L17 L21 | L6 L14 L16 | L6 L12 L17 | L6 L10 L12 L17 | L5 L10 L13 L17 L21 | L5 L13 L21 bodies 1
extrude "Extrude5" add sketch "Sketch2" against normal blind 3 contours L10 L17 L21 bodies 1
extrude "Extrude6" add sketch "Sketch2" against normal blind 3 contours L11 L16 L21 bodies 1
